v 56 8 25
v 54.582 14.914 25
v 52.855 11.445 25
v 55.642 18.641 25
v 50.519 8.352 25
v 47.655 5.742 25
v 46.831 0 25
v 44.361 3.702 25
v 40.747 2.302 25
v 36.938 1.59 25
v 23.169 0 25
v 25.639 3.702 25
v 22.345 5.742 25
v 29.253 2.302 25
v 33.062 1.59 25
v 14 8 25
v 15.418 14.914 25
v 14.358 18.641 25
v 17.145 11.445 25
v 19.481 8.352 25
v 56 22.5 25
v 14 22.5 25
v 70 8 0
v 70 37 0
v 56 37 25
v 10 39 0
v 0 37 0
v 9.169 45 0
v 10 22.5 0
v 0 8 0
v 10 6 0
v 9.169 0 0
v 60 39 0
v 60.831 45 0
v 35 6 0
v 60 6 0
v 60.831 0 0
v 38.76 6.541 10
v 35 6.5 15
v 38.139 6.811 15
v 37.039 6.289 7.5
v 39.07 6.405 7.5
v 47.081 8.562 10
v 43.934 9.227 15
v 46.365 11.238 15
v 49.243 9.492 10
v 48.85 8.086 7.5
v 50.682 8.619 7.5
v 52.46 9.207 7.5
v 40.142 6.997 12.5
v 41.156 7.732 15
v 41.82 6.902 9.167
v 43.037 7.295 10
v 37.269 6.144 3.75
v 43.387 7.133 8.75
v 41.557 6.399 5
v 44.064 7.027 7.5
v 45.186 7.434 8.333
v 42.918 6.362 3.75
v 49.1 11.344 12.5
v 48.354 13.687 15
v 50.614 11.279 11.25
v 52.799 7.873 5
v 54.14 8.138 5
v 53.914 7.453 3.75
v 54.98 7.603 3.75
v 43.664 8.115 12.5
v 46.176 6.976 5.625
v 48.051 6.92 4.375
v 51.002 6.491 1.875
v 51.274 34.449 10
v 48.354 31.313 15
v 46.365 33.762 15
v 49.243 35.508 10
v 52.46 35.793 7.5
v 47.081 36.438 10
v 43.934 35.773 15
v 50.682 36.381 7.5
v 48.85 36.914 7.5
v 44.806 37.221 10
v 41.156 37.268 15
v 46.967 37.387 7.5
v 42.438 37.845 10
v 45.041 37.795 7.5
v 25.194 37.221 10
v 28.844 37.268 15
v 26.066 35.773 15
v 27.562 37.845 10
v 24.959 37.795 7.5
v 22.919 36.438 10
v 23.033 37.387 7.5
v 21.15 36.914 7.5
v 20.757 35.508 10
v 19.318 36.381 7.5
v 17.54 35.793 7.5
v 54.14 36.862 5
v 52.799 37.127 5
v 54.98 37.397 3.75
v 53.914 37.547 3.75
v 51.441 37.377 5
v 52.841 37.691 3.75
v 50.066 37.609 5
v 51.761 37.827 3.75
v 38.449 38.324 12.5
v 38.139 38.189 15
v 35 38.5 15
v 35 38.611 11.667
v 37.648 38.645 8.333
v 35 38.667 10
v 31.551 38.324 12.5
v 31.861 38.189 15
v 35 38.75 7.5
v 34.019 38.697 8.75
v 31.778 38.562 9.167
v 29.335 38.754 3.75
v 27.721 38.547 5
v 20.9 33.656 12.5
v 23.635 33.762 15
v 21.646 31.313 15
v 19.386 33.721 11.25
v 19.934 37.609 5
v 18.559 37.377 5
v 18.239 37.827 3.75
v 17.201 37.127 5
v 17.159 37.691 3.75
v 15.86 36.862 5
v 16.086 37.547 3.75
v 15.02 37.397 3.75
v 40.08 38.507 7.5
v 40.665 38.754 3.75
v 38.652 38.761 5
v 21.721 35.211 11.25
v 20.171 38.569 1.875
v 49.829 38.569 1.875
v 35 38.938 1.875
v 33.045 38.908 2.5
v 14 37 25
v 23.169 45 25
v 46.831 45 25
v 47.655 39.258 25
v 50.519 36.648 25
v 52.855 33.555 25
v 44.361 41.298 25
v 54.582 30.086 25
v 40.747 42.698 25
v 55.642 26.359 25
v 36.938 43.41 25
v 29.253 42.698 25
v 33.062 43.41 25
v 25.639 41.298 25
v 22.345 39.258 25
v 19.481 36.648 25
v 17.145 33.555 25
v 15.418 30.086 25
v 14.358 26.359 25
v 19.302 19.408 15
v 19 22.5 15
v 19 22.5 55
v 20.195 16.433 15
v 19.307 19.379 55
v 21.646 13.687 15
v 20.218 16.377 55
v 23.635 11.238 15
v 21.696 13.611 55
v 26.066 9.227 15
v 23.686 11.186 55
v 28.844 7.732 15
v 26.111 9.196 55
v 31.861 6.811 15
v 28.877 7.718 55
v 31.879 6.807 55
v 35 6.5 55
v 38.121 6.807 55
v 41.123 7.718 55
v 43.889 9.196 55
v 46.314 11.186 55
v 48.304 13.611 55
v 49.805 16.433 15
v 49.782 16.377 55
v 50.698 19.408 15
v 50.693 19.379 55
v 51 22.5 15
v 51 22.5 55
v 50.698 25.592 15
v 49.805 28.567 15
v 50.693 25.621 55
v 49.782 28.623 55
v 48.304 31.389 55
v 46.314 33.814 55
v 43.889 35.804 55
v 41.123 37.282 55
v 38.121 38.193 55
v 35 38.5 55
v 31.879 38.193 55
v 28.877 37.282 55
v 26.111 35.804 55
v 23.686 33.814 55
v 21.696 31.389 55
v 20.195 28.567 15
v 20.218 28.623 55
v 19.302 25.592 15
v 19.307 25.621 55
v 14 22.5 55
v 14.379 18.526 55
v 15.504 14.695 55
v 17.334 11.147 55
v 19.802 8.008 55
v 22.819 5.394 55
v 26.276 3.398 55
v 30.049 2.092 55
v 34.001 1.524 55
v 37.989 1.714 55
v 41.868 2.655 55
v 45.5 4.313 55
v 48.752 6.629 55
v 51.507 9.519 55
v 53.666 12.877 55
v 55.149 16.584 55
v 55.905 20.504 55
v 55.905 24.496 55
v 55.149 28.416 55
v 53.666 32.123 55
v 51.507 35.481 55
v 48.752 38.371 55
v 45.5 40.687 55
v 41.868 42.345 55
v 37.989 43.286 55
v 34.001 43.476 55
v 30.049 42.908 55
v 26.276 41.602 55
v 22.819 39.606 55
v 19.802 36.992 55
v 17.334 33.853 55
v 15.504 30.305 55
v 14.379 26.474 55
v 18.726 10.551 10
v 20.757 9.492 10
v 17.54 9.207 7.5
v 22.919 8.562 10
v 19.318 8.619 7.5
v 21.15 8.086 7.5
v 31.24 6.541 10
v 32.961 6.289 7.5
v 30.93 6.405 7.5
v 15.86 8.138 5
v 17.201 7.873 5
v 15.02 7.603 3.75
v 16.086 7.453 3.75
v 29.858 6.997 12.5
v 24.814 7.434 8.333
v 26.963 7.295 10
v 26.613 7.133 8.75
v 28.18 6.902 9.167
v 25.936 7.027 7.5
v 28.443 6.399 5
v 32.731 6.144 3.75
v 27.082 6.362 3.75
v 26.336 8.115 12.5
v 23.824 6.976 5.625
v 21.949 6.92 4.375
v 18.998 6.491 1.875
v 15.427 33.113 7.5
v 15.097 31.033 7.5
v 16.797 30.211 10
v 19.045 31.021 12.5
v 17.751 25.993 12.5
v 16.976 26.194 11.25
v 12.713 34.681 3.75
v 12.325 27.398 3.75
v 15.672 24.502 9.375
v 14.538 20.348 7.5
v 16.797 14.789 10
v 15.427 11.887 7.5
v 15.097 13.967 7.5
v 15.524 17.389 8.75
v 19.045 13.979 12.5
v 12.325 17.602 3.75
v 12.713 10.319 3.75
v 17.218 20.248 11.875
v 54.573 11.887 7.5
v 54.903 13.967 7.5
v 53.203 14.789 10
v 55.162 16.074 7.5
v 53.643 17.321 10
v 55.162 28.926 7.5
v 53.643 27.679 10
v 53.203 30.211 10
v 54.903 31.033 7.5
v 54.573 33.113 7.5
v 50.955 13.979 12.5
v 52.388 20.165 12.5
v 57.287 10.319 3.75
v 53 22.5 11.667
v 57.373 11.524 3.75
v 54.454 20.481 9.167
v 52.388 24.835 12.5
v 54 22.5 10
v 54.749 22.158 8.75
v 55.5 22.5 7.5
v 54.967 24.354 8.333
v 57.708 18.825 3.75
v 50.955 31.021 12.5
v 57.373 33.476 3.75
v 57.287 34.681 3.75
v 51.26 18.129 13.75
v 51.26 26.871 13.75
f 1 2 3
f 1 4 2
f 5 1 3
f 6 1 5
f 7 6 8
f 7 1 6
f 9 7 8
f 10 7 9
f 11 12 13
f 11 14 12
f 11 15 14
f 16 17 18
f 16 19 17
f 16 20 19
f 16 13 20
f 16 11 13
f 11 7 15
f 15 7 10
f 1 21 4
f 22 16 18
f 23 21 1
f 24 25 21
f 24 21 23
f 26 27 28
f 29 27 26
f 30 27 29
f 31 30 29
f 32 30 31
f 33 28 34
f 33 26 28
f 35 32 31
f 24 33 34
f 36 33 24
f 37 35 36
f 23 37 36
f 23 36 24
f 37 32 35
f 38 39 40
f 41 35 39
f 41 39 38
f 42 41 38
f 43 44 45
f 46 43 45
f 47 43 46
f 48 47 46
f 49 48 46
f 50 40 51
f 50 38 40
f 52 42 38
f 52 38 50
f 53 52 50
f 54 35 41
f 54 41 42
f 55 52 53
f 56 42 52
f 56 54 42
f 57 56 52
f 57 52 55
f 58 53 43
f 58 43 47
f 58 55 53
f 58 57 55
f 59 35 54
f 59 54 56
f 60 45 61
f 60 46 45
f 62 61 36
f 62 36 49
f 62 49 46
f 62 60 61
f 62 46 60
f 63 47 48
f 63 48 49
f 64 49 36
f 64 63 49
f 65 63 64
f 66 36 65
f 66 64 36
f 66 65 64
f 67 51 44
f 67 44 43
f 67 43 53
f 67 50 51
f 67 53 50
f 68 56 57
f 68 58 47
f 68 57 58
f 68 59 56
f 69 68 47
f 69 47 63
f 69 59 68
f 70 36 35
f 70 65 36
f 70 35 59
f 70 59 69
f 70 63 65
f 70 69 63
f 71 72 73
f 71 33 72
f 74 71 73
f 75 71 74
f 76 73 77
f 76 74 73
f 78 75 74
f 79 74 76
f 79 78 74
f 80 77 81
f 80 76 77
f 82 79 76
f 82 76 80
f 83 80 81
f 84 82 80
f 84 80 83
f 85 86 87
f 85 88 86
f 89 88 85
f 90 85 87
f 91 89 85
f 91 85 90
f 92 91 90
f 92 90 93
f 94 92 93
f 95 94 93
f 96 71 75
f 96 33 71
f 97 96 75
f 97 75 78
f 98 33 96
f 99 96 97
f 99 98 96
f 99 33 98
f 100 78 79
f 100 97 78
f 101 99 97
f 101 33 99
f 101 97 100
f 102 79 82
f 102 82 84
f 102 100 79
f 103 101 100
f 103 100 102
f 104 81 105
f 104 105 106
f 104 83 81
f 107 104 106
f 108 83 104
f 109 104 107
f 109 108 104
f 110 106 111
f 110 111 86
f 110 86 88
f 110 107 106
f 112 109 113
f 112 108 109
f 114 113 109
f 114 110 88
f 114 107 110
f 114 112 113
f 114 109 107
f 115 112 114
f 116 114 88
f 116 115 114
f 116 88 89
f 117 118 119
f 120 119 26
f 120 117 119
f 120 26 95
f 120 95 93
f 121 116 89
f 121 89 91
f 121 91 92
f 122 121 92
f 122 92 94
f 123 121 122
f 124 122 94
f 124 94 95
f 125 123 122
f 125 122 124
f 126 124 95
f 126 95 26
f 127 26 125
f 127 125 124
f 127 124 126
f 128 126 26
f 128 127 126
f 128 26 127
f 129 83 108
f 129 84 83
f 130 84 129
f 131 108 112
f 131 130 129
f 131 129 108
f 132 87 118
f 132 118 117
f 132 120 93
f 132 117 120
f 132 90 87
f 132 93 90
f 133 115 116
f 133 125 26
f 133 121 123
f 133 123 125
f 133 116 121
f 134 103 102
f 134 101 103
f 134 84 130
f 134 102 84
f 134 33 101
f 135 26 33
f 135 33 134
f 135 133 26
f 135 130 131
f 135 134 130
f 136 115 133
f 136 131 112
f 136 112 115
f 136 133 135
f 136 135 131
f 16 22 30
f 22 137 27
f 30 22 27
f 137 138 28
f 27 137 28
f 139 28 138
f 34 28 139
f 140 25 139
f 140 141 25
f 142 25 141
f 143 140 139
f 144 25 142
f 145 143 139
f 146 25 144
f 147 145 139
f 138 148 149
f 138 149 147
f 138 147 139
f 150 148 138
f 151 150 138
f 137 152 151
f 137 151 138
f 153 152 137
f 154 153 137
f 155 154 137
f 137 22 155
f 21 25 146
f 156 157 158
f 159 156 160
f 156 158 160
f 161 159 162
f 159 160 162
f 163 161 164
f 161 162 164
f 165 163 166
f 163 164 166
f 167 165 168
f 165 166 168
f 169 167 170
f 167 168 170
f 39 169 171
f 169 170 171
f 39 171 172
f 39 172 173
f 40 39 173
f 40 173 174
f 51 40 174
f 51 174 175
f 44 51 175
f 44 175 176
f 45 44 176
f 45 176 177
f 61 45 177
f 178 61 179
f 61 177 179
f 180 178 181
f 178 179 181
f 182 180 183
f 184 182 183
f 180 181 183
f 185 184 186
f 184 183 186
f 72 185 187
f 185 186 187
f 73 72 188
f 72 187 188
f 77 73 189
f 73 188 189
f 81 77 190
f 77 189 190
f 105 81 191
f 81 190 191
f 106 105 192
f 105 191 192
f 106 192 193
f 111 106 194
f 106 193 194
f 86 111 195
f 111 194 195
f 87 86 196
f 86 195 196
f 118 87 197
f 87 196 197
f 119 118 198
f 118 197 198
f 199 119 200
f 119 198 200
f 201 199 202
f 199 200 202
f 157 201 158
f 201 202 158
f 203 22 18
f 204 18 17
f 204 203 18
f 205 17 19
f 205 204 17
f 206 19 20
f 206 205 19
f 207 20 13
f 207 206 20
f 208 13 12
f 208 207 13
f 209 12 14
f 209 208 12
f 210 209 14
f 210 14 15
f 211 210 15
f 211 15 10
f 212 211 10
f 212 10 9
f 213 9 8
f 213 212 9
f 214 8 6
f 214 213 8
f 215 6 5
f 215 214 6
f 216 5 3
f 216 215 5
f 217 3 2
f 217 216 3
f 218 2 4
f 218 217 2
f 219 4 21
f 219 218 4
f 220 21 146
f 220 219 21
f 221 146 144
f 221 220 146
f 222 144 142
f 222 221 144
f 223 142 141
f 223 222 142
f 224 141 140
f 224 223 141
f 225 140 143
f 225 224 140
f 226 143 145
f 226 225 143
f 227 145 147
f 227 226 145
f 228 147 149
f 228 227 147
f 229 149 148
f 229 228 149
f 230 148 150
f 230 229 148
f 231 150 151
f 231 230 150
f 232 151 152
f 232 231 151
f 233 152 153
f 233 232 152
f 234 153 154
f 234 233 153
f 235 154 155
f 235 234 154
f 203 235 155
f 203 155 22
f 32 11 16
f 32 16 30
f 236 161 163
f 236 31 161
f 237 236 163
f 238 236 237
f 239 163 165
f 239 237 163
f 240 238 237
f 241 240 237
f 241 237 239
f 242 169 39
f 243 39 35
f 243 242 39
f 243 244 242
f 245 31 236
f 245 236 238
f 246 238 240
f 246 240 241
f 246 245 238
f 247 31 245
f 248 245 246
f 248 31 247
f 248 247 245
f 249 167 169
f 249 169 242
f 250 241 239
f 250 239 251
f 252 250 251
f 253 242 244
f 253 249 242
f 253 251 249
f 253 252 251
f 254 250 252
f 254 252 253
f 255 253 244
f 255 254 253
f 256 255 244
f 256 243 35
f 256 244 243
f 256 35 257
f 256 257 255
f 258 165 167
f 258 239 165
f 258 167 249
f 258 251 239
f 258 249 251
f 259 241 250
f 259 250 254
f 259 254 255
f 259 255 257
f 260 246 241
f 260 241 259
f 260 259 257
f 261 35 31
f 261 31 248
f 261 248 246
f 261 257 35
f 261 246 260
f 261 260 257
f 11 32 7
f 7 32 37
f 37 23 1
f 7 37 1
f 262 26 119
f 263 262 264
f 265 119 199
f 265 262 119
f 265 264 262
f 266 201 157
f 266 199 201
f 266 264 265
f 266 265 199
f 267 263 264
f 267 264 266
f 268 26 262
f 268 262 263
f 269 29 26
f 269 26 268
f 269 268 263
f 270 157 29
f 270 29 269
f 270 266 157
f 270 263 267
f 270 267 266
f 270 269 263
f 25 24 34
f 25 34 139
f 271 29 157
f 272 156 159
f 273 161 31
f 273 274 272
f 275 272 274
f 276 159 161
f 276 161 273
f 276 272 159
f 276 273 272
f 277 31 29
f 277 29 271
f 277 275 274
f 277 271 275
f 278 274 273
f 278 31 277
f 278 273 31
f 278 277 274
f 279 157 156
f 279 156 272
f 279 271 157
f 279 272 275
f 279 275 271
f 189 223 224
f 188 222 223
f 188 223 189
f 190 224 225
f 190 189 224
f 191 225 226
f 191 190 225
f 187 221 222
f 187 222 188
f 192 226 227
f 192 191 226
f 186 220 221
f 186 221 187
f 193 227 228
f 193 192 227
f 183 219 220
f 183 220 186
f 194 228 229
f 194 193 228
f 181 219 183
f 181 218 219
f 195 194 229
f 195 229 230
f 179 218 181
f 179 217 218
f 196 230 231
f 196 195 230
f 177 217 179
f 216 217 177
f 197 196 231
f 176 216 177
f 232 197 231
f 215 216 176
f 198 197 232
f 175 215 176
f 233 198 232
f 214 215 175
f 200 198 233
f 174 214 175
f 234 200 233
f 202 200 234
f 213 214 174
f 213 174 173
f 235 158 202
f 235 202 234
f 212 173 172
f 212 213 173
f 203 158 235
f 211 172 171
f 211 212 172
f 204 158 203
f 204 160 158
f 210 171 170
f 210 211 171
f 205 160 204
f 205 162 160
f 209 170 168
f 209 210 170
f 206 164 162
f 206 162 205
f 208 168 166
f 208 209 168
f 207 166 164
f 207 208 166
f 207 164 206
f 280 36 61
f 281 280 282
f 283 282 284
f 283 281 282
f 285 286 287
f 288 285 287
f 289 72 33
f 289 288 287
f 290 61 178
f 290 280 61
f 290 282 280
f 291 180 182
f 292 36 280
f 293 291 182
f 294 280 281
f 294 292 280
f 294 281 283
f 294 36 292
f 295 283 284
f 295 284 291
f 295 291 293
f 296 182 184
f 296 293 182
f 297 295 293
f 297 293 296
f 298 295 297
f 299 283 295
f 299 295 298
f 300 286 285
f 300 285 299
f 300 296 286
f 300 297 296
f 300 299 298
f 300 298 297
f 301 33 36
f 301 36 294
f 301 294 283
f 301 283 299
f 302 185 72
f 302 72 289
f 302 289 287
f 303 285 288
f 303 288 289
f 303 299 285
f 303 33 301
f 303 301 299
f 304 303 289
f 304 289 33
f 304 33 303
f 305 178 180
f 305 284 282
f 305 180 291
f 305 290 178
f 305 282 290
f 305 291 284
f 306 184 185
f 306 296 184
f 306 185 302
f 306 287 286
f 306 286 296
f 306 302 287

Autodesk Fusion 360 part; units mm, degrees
sketch "草图1" plane through (0, 0, 0) normal (0, 1, 0) x (1, 0, 0)
  line L0 (0, 0) -> (70, 0)
  line L1 (70, 0) -> (70, -55)
  line L2 (70, -55) -> (0, -55)
  line L3 (0, -55) -> (0, 0)
  dimension "d1" = 70
  dimension "d2" = 55
extrude "拉伸1" add sketch "草图1" along normal blind 45
sketch "草图2" plane through (0, 0, 55) normal (0, 0, 1) x (-1, 0, 0)
  line L0 (0, 0) -> (-70, 0)
  line L1 (-70, 0) -> (-70, -45)
  line L2 (-70, -45) -> (0, -45)
  line L3 (0, -45) -> (0, 0)
  line L4 (-35, -45) -> (-35, -22.5)
  circle A0 centre (-35, -22.5) radius 16
  circle A1 centre (-35, -22.5) radius 21
  dimension "d5" = 22.5
  dimension "d6" = 32
  dimension "d12" = 42
extrude "拉伸2" cut sketch "草图2" against normal blind 40 contours A0
sketch "草图3" plane through (0, 0, 0) normal (0, 0, -1) x (1, 0, 0)
  line L0 (70, 0) -> (0, 0)
  line L1 (0, 0) -> (0, -45)
  line L2 (0, -45) -> (70, -45)
  line L3 (70, -45) -> (70, 0)
  line L4 (35, 0) -> (35, -22.5)
  line L5 (60, -39) -> (10, -39)
  line L6 (10, -39) -> (10, -6)
  line L7 (10, -6) -> (60, -6)
  line L8 (60, -6) -> (60, -39)
  line L9 (60, -39) -> (10, -6) construction
  line L10 (10, -39) -> (60, -6) construction
  point P0 (35, -22.5)
  dimension "d9" = 22.5
  dimension "d10" = 50
  dimension "d11" = 33
sketch "草图4" plane through (0, 0, 15) normal (0, 0, 1) x (-1, 0, 0)
  circle A0 centre (-35, -22.5) radius 16
loft "放样1" cut profiles "草图4", "草图3" section 1 section 2 contours L5 L6 L7 L8
extrude "拉伸4" cut sketch "草图2" against normal blind 30 contours L0 L1 L2 L3
sketch "草图5" plane through (0, 0, 25) normal (0, 0, 1) x (-1, 0, 0)
  circle A0 centre (-35, -22.5) radius 21
  line L0 (0, -45) -> (0, 0)
  line L1 (0, 0) -> (-70, 0)
  line L2 (-70, 0) -> (-70, -45)
  line L3 (-70, -45) -> (0, -45)
  circle A1 centre (-35, -22.5) radius 21
sketch "草图6" plane through (0, 45, 0) normal (0, 1, 0) x (-1, 0, 0)
  line L0 (0, 25) -> (-70, 25)
  line L1 (-70, 25) -> (-70, 0)
  line L2 (-70, 0) -> (0, 0)
  line L3 (0, 0) -> (0, 25)
  line L4 (-35, 25) -> (-56, 25)
  line L5 (-56, 25) -> (-70, 0)
  line L6 (-35, 25) -> (-14, 25)
  line L7 (-14, 25) -> (0, 0)
  dimension "d17" = 21
  dimension "d18" = 21
extrude "拉伸5" cut sketch "草图6" against normal blind 45 contours L0 L3 L7 | L0 L1 L5
chamfer "倒角1" distance 8 angle 45 4 edges at (7, 45, 12.5) (7, 0, 12.5) (63, 45, 12.5) (63, 0, 12.5)
extrude "拉伸3" [suppressed]
